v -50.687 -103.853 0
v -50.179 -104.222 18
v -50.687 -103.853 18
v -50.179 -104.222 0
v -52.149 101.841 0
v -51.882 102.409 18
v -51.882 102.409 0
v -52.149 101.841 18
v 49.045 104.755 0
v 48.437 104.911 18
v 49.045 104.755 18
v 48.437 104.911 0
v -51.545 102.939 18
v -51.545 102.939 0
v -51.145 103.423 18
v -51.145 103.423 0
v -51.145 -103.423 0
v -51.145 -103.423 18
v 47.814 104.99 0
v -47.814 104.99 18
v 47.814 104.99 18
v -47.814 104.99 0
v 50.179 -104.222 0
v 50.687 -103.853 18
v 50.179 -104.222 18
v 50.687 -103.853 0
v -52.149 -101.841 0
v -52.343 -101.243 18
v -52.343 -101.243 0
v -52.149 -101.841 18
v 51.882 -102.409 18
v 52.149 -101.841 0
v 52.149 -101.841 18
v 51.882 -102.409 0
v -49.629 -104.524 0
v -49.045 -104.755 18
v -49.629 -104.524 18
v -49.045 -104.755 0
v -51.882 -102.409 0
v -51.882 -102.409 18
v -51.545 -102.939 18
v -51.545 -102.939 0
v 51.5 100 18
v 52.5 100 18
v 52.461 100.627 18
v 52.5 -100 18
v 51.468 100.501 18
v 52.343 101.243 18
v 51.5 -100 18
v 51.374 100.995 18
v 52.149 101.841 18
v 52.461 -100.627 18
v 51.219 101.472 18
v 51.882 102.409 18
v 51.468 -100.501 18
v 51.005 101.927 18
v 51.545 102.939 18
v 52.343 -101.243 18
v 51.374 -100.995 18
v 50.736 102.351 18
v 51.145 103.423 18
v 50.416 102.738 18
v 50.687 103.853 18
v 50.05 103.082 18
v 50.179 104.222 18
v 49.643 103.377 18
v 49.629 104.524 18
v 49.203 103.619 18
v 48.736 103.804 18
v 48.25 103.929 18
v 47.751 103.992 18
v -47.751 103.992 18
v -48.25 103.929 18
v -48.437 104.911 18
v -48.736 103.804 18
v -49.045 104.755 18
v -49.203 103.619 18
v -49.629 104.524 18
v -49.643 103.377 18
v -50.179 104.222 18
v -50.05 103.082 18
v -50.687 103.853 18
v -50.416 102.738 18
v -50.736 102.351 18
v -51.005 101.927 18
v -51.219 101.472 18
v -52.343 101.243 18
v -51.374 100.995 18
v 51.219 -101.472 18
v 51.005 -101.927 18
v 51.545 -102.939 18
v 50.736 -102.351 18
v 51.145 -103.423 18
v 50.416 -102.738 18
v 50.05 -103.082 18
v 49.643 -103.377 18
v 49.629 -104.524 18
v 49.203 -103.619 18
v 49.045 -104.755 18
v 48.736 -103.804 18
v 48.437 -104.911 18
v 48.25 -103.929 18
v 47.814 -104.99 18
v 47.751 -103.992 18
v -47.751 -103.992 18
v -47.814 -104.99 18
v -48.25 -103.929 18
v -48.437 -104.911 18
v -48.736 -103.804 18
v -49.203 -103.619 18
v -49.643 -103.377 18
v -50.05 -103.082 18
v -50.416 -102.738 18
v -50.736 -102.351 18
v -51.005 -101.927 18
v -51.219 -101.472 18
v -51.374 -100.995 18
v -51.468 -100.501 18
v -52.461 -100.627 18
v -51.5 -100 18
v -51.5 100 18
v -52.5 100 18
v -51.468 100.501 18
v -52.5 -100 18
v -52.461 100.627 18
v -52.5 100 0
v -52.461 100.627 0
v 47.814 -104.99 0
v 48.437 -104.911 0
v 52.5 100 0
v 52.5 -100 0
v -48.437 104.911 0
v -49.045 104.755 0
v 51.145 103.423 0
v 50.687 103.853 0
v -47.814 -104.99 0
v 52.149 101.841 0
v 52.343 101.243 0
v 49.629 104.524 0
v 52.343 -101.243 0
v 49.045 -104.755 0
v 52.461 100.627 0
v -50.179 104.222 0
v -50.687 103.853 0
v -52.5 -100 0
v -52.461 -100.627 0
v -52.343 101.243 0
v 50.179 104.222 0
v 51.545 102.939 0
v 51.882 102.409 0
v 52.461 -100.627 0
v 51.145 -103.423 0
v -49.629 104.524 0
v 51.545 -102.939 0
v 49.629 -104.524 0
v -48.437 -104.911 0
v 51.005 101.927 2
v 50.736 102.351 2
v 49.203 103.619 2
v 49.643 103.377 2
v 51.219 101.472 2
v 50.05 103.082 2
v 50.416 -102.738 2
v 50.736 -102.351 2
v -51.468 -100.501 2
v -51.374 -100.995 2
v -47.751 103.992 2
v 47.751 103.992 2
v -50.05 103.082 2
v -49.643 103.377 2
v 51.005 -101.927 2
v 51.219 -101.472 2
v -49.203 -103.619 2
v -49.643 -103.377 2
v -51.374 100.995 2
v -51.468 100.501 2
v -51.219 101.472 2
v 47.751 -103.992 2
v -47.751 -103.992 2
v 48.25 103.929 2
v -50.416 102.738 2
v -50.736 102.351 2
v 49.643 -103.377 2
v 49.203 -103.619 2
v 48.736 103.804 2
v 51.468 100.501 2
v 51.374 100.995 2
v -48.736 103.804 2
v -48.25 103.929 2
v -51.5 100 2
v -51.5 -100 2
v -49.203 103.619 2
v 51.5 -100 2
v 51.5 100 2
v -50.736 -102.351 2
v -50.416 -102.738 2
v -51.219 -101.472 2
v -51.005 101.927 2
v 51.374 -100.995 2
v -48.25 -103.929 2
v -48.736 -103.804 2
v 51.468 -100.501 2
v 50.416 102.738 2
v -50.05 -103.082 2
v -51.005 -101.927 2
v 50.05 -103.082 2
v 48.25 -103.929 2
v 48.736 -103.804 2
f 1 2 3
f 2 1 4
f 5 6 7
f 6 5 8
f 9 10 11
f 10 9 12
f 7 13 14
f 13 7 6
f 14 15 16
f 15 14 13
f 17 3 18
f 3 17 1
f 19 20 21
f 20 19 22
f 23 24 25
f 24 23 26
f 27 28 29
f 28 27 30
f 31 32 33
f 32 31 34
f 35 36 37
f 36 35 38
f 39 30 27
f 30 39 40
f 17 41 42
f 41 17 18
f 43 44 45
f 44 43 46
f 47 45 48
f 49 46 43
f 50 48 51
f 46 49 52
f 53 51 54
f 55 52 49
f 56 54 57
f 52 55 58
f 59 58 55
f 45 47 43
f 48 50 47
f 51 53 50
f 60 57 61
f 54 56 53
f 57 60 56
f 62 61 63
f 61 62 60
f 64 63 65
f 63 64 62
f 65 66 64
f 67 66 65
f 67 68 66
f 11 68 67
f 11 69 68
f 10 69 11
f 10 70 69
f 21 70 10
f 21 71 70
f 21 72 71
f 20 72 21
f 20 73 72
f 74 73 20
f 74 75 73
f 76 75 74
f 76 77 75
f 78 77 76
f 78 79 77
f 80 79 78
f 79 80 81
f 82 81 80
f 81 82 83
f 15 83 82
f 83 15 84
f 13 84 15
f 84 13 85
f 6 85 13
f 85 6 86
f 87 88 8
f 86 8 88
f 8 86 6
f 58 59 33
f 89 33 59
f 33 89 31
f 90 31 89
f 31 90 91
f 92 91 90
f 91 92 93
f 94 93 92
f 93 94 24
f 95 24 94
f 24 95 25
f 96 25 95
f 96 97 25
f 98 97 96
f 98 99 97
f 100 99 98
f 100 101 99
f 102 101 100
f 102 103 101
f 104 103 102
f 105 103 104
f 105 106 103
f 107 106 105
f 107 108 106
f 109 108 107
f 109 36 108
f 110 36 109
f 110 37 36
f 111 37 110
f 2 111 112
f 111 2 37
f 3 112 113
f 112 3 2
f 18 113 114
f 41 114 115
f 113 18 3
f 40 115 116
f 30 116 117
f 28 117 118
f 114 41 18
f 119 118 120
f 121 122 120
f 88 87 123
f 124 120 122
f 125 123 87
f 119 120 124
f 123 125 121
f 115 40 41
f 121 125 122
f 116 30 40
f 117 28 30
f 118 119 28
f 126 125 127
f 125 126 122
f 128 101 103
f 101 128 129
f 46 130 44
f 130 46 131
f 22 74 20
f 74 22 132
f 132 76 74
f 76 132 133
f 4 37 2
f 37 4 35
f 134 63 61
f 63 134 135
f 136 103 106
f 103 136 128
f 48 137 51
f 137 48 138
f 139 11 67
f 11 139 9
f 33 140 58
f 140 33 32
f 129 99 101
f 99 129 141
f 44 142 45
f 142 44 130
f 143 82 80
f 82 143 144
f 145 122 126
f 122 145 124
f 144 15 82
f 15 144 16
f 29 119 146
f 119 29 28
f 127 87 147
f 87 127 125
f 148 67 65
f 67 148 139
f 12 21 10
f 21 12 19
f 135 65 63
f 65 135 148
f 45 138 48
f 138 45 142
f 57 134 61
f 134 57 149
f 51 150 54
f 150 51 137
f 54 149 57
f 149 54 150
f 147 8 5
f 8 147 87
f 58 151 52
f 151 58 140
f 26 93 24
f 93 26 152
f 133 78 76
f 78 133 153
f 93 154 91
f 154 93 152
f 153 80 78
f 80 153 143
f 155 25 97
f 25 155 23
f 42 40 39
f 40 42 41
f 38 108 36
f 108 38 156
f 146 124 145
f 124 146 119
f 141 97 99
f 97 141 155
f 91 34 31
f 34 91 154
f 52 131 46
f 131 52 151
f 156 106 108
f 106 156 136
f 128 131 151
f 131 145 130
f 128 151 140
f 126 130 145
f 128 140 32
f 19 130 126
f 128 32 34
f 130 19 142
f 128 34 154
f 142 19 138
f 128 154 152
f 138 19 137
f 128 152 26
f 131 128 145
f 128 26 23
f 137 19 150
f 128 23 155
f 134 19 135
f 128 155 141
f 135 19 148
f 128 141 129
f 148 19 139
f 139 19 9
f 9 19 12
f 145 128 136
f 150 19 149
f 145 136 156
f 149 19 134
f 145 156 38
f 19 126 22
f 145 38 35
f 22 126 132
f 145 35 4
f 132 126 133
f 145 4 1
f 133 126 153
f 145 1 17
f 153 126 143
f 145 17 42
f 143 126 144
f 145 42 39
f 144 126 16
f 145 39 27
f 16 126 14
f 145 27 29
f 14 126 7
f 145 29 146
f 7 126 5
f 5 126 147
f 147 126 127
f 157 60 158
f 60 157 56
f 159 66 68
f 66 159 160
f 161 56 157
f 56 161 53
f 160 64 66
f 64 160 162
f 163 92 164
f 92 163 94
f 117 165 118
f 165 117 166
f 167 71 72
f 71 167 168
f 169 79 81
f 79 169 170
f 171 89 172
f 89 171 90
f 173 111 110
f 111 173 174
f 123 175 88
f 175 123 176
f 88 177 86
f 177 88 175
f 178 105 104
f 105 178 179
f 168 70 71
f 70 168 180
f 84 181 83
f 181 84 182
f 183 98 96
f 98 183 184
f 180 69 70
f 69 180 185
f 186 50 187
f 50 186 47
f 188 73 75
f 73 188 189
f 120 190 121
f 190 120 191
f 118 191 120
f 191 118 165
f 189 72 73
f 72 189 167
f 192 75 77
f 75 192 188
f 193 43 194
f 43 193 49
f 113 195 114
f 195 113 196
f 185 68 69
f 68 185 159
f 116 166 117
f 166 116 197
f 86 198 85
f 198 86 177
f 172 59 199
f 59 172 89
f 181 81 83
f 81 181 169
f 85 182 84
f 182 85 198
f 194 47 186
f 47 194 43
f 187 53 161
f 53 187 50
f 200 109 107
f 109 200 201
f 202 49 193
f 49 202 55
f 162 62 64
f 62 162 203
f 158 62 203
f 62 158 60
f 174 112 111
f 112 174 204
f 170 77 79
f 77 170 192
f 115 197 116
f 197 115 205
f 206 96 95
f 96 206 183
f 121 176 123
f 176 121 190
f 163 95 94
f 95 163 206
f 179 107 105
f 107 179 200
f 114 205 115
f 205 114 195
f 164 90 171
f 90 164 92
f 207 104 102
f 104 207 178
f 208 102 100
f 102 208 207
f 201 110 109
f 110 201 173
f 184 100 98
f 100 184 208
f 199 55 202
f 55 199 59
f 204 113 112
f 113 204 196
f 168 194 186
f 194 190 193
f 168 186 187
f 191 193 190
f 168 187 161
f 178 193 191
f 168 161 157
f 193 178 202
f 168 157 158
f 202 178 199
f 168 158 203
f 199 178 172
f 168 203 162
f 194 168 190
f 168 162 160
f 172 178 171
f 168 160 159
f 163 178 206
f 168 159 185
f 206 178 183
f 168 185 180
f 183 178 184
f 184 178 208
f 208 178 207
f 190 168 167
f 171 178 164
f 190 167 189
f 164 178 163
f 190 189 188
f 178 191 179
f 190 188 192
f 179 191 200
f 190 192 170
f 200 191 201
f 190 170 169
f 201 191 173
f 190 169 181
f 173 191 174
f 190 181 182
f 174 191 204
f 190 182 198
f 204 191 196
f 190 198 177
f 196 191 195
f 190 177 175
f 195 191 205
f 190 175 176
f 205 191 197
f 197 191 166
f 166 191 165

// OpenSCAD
$fn = 50;


difference() {
	union() {
		hull() {
			translate(v = [-47.5000000000, 100.0000000000, 0]) {
				cylinder(h = 18, r = 5);
			}
			translate(v = [47.5000000000, 100.0000000000, 0]) {
				cylinder(h = 18, r = 5);
			}
			translate(v = [-47.5000000000, -100.0000000000, 0]) {
				cylinder(h = 18, r = 5);
			}
			translate(v = [47.5000000000, -100.0000000000, 0]) {
				cylinder(h = 18, r = 5);
			}
		}
	}
	union() {
		translate(v = [0, 0, 2]) {
			hull() {
				translate(v = [-47.5000000000, 100.0000000000, 0]) {
					cylinder(h = 16, r = 4);
				}
				translate(v = [47.5000000000, 100.0000000000, 0]) {
					cylinder(h = 16, r = 4);
				}
				translate(v = [-47.5000000000, -100.0000000000, 0]) {
					cylinder(h = 16, r = 4);
				}
				translate(v = [47.5000000000, -100.0000000000, 0]) {
					cylinder(h = 16, r = 4);
				}
			}
		}
	}
}
